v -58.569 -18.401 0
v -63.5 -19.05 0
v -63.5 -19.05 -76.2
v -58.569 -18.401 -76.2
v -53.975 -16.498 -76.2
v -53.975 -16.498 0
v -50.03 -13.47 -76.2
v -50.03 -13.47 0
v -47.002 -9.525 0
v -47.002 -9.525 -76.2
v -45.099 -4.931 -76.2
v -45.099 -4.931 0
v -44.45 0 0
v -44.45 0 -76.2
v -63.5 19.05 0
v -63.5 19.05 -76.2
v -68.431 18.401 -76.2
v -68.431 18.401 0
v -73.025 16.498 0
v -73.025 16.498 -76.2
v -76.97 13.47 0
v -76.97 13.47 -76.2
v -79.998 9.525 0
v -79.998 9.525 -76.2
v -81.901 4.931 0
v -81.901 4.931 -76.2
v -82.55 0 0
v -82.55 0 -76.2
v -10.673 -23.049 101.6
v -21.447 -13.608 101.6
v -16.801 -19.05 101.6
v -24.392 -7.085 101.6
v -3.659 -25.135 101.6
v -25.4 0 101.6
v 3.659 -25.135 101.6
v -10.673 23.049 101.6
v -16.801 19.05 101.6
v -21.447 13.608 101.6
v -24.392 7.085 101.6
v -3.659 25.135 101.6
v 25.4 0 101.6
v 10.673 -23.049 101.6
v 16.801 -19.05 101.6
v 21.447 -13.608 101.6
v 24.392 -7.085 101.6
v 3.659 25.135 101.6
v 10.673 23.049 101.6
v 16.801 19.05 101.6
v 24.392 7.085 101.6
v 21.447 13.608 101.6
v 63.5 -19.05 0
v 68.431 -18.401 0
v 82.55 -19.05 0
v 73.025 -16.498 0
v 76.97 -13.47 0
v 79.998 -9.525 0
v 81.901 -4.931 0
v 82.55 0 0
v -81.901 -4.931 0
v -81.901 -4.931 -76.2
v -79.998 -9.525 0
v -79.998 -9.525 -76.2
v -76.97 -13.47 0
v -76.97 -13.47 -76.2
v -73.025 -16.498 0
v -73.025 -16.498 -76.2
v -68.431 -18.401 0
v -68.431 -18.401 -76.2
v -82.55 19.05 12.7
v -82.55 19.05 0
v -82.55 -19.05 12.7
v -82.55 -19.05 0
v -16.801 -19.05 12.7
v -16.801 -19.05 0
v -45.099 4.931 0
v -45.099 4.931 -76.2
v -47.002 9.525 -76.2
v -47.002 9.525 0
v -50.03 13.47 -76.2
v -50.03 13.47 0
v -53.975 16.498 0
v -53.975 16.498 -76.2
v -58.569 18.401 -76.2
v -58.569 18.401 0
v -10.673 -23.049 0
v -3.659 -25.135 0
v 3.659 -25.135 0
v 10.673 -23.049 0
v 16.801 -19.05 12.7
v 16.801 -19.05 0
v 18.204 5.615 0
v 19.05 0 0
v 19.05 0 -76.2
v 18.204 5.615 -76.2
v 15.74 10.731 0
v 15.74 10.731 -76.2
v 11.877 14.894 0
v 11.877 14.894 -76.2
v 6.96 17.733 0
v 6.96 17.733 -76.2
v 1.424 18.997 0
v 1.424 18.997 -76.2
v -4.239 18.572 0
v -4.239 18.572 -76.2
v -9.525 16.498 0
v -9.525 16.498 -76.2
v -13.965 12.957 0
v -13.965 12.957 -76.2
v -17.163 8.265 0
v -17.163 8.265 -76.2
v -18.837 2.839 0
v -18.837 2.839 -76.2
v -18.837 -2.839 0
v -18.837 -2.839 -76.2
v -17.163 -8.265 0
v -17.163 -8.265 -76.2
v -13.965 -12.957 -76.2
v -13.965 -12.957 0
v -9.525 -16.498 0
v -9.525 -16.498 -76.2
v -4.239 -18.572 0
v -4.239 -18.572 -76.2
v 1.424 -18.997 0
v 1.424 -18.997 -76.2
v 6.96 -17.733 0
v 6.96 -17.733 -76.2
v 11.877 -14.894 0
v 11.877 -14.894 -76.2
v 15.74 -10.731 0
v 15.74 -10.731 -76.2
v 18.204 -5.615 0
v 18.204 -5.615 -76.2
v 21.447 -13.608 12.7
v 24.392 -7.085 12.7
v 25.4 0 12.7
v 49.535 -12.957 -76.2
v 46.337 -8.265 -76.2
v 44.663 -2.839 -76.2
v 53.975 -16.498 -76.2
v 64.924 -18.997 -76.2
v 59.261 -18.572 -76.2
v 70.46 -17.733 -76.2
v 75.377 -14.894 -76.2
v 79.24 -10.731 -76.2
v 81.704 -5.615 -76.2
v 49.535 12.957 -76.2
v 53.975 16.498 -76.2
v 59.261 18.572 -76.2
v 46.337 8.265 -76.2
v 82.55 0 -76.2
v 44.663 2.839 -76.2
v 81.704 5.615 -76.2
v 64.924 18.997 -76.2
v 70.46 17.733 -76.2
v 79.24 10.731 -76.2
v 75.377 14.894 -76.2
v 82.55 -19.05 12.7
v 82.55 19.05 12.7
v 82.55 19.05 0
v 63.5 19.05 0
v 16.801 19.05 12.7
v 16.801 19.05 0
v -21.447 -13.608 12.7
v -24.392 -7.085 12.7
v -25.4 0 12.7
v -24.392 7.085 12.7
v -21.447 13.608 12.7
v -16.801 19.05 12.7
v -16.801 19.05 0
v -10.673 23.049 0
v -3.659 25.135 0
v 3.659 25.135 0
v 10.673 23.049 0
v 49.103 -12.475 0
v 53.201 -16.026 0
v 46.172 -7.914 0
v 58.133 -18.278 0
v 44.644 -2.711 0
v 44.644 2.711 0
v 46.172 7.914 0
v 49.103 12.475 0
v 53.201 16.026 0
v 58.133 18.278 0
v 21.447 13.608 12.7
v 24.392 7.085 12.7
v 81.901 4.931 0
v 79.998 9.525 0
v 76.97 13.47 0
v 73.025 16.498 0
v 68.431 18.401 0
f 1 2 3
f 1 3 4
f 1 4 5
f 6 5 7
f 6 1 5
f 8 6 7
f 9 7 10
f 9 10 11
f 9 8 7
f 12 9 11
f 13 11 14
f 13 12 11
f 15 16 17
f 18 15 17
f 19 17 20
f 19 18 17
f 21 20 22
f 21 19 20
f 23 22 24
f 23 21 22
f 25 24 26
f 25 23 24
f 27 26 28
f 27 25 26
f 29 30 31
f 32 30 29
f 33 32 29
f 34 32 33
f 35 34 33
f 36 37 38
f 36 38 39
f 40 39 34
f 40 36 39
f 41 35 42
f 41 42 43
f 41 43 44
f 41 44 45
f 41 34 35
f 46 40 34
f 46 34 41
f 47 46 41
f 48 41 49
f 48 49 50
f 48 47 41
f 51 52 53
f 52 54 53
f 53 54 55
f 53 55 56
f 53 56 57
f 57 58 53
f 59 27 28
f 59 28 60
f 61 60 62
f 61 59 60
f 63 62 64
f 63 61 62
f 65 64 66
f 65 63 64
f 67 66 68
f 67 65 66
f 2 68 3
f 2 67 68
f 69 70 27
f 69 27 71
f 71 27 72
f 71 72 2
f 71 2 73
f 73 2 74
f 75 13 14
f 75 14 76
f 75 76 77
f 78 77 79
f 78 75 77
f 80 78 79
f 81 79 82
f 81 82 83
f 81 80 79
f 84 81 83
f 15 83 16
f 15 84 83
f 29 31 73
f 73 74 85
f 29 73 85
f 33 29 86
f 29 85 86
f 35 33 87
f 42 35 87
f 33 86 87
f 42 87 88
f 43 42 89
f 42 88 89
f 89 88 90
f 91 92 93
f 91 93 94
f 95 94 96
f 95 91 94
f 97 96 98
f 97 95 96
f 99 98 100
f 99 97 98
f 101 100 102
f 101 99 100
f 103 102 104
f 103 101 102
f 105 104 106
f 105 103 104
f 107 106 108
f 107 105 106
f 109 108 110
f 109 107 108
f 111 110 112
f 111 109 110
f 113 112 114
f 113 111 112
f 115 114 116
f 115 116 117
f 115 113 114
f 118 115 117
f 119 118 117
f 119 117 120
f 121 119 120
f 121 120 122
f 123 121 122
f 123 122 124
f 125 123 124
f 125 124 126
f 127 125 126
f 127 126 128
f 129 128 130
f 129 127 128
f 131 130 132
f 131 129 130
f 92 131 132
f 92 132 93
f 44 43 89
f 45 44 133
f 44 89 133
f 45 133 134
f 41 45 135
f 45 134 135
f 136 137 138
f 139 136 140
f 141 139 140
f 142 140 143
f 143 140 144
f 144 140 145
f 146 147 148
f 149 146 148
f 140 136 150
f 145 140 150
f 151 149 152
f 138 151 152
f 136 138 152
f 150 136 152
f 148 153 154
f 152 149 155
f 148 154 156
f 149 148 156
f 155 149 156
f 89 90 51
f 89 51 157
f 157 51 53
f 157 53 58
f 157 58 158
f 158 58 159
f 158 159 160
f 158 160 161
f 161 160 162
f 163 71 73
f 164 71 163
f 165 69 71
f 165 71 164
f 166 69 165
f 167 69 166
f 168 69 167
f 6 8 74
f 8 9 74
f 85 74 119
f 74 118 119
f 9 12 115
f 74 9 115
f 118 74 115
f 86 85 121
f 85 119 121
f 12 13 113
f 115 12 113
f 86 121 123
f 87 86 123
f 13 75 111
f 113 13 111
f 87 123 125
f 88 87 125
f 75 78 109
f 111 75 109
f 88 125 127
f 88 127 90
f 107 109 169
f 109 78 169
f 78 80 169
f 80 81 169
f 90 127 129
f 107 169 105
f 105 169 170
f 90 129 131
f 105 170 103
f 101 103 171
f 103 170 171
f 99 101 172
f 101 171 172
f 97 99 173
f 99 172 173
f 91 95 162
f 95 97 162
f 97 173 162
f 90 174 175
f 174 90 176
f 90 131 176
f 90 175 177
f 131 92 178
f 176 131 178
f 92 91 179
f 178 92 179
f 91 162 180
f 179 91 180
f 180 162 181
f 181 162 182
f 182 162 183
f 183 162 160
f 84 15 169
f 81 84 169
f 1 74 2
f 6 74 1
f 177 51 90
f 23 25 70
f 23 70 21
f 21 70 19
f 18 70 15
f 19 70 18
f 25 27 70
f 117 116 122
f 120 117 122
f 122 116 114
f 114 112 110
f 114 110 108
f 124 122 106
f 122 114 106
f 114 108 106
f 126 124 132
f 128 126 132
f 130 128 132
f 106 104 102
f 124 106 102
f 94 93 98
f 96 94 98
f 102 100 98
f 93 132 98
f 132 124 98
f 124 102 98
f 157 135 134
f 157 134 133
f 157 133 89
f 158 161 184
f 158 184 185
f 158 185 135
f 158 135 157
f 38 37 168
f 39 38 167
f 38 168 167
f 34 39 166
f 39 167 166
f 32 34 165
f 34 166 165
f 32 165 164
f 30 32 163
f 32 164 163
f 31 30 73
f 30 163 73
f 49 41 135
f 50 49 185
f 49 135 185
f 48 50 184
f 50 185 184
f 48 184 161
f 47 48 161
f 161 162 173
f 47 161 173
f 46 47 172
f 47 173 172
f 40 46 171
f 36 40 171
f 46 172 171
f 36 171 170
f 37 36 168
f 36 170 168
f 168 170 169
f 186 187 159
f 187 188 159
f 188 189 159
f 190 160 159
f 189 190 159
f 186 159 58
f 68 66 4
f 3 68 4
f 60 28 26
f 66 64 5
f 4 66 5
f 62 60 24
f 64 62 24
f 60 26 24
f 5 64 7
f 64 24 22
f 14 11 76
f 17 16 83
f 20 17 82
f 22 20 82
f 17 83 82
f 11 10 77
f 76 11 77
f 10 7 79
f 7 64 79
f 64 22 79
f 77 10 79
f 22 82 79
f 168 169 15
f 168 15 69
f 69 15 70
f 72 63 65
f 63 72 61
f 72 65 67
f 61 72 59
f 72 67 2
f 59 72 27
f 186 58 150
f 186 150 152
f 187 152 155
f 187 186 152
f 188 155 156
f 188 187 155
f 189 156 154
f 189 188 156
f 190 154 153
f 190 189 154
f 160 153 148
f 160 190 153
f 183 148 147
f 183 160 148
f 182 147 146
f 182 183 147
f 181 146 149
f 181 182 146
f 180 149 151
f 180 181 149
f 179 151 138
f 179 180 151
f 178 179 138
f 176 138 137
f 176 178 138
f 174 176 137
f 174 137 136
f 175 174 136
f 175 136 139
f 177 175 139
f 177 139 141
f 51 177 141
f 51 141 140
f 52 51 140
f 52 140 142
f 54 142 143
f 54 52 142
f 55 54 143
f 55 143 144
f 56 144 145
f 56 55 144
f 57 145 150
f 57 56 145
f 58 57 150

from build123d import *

# Parameters (mm, degrees)
F1_DEPTH = 12.7
F2_DEPTH = 101.6
F3_DEPTH = 76.2


with BuildPart() as f1:
    # F0 (on Top) → F1 (new body)
    with BuildSketch(Plane.XY):
        with BuildLine():
            ThreePointArc((-16.8005208253, -19.05), (-25.4, 0), (-16.8005208253, 19.05))
            Line((-16.8005208253, 19.05), (-63.5, 19.05))
            ThreePointArc((-63.5, 19.05), (-50.0296158184, 13.4703841816), (-44.45, 0))
            ThreePointArc((-44.45, 0), (-50.0296158184, -13.4703841816), (-63.5, -19.05))
            Line((-63.5, -19.05), (-16.8005208253, -19.05))
        make_face()
        with BuildLine():
            ThreePointArc((-82.55, 1.56e-07), (-76.9703841264, 13.4703842368), (-63.5, 19.05))
            Line((-63.5, 19.05), (-82.55, 19.05))
            Line((-82.55, 19.05), (-82.55, 1.56e-07))
        make_face()
        with BuildLine():
            Line((-82.55, -19.05), (-63.5, -19.05))
            ThreePointArc((-63.5, -19.05), (-76.9703842368, -13.4703841264), (-82.55, 1.56e-07))
            Line((-82.55, 1.56e-07), (-82.55, -19.05))
        make_face()
        with BuildLine():
            Line((82.55, 19.05), (63.5, 19.05))
            ThreePointArc((63.5, 19.05), (76.9703841816, 13.4703841816), (82.55, 0))
            Line((82.55, 0), (82.55, 19.05))
        make_face()
        with BuildLine():
            ThreePointArc((82.55, 0), (76.9703841816, -13.4703841816), (63.5, -19.05))
            Line((63.5, -19.05), (82.55, -19.05))
            Line((82.55, -19.05), (82.55, 0))
        make_face()
        with BuildLine():
            ThreePointArc((16.8005208253, 19.05), (23.1505208253, 10.4505208253), (25.4, 0))
            ThreePointArc((25.4, 0), (23.1505208253, -10.4505208253), (16.8005208253, -19.05))
            Line((16.8005208253, -19.05), (63.5, -19.05))
            ThreePointArc((63.5, -19.05), (44.45, 0), (63.5, 19.05))
            Line((63.5, 19.05), (16.8005208253, 19.05))
        make_face()
        with BuildLine():
            ThreePointArc((82.55, 0), (76.9703841816, 13.4703841816), (63.5, 19.05))
            ThreePointArc((63.5, 19.05), (44.45, 0), (63.5, -19.05))
            ThreePointArc((63.5, -19.05), (76.9703841816, -13.4703841816), (82.55, 0))
        make_face()
        with BuildLine():
            ThreePointArc((19.05, 0), (13.4703841605, 13.4703842027), (-5.96e-08, 19.05))
            ThreePointArc((-5.96e-08, 19.05), (-19.05, 7.1e-09), (-7.38e-08, -19.05))
            ThreePointArc((-7.38e-08, -19.05), (13.4703841555, -13.4703842077), (19.05, 0))
        make_face()
        with BuildLine():
            ThreePointArc((16.8005208253, -19.05), (23.1505208253, -10.4505208253), (25.4, 0))
            ThreePointArc((25.4, 0), (23.1505208253, 10.4505208253), (16.8005208253, 19.05))
            Line((16.8005208253, 19.05), (-5.96e-08, 19.05))
            ThreePointArc((-5.96e-08, 19.05), (13.4703841605, 13.4703842027), (19.05, 0))
            ThreePointArc((19.05, 0), (13.4703841555, -13.4703842077), (-7.38e-08, -19.05))
            Line((-7.38e-08, -19.05), (16.8005208253, -19.05))
        make_face()
        with BuildLine():
            Line((-5.96e-08, 19.05), (-16.8005208253, 19.05))
            ThreePointArc((-16.8005208253, 19.05), (-25.4, 0), (-16.8005208253, -19.05))
            Line((-16.8005208253, -19.05), (-7.38e-08, -19.05))
            ThreePointArc((-7.38e-08, -19.05), (-19.05, 7.1e-09), (-5.96e-08, 19.05))
        make_face()
        with BuildLine():
            ThreePointArc((-44.45, 0), (-50.0296158184, 13.4703841816), (-63.5, 19.05))
            ThreePointArc((-63.5, 19.05), (-76.9703841264, 13.4703842368), (-82.55, 1.56e-07))
            ThreePointArc((-82.55, 1.56e-07), (-76.9703842368, -13.4703841264), (-63.5, -19.05))
            ThreePointArc((-63.5, -19.05), (-50.0296158184, -13.4703841816), (-44.45, 0))
        make_face()
    extrude(amount=F1_DEPTH)

    # F0 (on Top) → F2 (join)
    with BuildSketch(Plane.XY):
        with BuildLine():
            Line((-5.96e-08, 19.05), (16.8005208253, 19.05))
            ThreePointArc((16.8005208253, 19.05), (0, 25.4), (-16.8005208253, 19.05))
            Line((-16.8005208253, 19.05), (-5.96e-08, 19.05))
        make_face()
        with BuildLine():
            ThreePointArc((16.8005208253, -19.05), (23.1505208253, -10.4505208253), (25.4, 0))
            ThreePointArc((25.4, 0), (23.1505208253, 10.4505208253), (16.8005208253, 19.05))
            Line((16.8005208253, 19.05), (-5.96e-08, 19.05))
            ThreePointArc((-5.96e-08, 19.05), (13.4703841605, 13.4703842027), (19.05, 0))
            ThreePointArc((19.05, 0), (13.4703841555, -13.4703842077), (-7.38e-08, -19.05))
            Line((-7.38e-08, -19.05), (16.8005208253, -19.05))
        make_face()
        with BuildLine():
            ThreePointArc((19.05, 0), (13.4703841605, 13.4703842027), (-5.96e-08, 19.05))
            ThreePointArc((-5.96e-08, 19.05), (-19.05, 7.1e-09), (-7.38e-08, -19.05))
            ThreePointArc((-7.38e-08, -19.05), (13.4703841555, -13.4703842077), (19.05, 0))
        make_face()
        with BuildLine():
            Line((-5.96e-08, 19.05), (-16.8005208253, 19.05))
            ThreePointArc((-16.8005208253, 19.05), (-25.4, 0), (-16.8005208253, -19.05))
            Line((-16.8005208253, -19.05), (-7.38e-08, -19.05))
            ThreePointArc((-7.38e-08, -19.05), (-19.05, 7.1e-09), (-5.96e-08, 19.05))
        make_face()
        with BuildLine():
            ThreePointArc((-16.8005208253, -19.05), (0, -25.4), (16.8005208253, -19.05))
            Line((16.8005208253, -19.05), (-7.38e-08, -19.05))
            Line((-7.38e-08, -19.05), (-16.8005208253, -19.05))
        make_face()
    extrude(amount=F2_DEPTH)

    # F0 (on Top) → F3 (join)
    with BuildSketch(Plane.XY):
        with BuildLine():
            ThreePointArc((82.55, 0), (76.9703841816, 13.4703841816), (63.5, 19.05))
            ThreePointArc((63.5, 19.05), (44.45, 0), (63.5, -19.05))
            ThreePointArc((63.5, -19.05), (76.9703841816, -13.4703841816), (82.55, 0))
        make_face()
        with BuildLine():
            ThreePointArc((19.05, 0), (13.4703841605, 13.4703842027), (-5.96e-08, 19.05))
            ThreePointArc((-5.96e-08, 19.05), (-19.05, 7.1e-09), (-7.38e-08, -19.05))
            ThreePointArc((-7.38e-08, -19.05), (13.4703841555, -13.4703842077), (19.05, 0))
        make_face()
        with BuildLine():
            ThreePointArc((-44.45, 0), (-50.0296158184, 13.4703841816), (-63.5, 19.05))
            ThreePointArc((-63.5, 19.05), (-76.9703841264, 13.4703842368), (-82.55, 1.56e-07))
            ThreePointArc((-82.55, 1.56e-07), (-76.9703842368, -13.4703841264), (-63.5, -19.05))
            ThreePointArc((-63.5, -19.05), (-50.0296158184, -13.4703841816), (-44.45, 0))
        make_face()
    extrude(amount=-F3_DEPTH)


solid = f1.part
